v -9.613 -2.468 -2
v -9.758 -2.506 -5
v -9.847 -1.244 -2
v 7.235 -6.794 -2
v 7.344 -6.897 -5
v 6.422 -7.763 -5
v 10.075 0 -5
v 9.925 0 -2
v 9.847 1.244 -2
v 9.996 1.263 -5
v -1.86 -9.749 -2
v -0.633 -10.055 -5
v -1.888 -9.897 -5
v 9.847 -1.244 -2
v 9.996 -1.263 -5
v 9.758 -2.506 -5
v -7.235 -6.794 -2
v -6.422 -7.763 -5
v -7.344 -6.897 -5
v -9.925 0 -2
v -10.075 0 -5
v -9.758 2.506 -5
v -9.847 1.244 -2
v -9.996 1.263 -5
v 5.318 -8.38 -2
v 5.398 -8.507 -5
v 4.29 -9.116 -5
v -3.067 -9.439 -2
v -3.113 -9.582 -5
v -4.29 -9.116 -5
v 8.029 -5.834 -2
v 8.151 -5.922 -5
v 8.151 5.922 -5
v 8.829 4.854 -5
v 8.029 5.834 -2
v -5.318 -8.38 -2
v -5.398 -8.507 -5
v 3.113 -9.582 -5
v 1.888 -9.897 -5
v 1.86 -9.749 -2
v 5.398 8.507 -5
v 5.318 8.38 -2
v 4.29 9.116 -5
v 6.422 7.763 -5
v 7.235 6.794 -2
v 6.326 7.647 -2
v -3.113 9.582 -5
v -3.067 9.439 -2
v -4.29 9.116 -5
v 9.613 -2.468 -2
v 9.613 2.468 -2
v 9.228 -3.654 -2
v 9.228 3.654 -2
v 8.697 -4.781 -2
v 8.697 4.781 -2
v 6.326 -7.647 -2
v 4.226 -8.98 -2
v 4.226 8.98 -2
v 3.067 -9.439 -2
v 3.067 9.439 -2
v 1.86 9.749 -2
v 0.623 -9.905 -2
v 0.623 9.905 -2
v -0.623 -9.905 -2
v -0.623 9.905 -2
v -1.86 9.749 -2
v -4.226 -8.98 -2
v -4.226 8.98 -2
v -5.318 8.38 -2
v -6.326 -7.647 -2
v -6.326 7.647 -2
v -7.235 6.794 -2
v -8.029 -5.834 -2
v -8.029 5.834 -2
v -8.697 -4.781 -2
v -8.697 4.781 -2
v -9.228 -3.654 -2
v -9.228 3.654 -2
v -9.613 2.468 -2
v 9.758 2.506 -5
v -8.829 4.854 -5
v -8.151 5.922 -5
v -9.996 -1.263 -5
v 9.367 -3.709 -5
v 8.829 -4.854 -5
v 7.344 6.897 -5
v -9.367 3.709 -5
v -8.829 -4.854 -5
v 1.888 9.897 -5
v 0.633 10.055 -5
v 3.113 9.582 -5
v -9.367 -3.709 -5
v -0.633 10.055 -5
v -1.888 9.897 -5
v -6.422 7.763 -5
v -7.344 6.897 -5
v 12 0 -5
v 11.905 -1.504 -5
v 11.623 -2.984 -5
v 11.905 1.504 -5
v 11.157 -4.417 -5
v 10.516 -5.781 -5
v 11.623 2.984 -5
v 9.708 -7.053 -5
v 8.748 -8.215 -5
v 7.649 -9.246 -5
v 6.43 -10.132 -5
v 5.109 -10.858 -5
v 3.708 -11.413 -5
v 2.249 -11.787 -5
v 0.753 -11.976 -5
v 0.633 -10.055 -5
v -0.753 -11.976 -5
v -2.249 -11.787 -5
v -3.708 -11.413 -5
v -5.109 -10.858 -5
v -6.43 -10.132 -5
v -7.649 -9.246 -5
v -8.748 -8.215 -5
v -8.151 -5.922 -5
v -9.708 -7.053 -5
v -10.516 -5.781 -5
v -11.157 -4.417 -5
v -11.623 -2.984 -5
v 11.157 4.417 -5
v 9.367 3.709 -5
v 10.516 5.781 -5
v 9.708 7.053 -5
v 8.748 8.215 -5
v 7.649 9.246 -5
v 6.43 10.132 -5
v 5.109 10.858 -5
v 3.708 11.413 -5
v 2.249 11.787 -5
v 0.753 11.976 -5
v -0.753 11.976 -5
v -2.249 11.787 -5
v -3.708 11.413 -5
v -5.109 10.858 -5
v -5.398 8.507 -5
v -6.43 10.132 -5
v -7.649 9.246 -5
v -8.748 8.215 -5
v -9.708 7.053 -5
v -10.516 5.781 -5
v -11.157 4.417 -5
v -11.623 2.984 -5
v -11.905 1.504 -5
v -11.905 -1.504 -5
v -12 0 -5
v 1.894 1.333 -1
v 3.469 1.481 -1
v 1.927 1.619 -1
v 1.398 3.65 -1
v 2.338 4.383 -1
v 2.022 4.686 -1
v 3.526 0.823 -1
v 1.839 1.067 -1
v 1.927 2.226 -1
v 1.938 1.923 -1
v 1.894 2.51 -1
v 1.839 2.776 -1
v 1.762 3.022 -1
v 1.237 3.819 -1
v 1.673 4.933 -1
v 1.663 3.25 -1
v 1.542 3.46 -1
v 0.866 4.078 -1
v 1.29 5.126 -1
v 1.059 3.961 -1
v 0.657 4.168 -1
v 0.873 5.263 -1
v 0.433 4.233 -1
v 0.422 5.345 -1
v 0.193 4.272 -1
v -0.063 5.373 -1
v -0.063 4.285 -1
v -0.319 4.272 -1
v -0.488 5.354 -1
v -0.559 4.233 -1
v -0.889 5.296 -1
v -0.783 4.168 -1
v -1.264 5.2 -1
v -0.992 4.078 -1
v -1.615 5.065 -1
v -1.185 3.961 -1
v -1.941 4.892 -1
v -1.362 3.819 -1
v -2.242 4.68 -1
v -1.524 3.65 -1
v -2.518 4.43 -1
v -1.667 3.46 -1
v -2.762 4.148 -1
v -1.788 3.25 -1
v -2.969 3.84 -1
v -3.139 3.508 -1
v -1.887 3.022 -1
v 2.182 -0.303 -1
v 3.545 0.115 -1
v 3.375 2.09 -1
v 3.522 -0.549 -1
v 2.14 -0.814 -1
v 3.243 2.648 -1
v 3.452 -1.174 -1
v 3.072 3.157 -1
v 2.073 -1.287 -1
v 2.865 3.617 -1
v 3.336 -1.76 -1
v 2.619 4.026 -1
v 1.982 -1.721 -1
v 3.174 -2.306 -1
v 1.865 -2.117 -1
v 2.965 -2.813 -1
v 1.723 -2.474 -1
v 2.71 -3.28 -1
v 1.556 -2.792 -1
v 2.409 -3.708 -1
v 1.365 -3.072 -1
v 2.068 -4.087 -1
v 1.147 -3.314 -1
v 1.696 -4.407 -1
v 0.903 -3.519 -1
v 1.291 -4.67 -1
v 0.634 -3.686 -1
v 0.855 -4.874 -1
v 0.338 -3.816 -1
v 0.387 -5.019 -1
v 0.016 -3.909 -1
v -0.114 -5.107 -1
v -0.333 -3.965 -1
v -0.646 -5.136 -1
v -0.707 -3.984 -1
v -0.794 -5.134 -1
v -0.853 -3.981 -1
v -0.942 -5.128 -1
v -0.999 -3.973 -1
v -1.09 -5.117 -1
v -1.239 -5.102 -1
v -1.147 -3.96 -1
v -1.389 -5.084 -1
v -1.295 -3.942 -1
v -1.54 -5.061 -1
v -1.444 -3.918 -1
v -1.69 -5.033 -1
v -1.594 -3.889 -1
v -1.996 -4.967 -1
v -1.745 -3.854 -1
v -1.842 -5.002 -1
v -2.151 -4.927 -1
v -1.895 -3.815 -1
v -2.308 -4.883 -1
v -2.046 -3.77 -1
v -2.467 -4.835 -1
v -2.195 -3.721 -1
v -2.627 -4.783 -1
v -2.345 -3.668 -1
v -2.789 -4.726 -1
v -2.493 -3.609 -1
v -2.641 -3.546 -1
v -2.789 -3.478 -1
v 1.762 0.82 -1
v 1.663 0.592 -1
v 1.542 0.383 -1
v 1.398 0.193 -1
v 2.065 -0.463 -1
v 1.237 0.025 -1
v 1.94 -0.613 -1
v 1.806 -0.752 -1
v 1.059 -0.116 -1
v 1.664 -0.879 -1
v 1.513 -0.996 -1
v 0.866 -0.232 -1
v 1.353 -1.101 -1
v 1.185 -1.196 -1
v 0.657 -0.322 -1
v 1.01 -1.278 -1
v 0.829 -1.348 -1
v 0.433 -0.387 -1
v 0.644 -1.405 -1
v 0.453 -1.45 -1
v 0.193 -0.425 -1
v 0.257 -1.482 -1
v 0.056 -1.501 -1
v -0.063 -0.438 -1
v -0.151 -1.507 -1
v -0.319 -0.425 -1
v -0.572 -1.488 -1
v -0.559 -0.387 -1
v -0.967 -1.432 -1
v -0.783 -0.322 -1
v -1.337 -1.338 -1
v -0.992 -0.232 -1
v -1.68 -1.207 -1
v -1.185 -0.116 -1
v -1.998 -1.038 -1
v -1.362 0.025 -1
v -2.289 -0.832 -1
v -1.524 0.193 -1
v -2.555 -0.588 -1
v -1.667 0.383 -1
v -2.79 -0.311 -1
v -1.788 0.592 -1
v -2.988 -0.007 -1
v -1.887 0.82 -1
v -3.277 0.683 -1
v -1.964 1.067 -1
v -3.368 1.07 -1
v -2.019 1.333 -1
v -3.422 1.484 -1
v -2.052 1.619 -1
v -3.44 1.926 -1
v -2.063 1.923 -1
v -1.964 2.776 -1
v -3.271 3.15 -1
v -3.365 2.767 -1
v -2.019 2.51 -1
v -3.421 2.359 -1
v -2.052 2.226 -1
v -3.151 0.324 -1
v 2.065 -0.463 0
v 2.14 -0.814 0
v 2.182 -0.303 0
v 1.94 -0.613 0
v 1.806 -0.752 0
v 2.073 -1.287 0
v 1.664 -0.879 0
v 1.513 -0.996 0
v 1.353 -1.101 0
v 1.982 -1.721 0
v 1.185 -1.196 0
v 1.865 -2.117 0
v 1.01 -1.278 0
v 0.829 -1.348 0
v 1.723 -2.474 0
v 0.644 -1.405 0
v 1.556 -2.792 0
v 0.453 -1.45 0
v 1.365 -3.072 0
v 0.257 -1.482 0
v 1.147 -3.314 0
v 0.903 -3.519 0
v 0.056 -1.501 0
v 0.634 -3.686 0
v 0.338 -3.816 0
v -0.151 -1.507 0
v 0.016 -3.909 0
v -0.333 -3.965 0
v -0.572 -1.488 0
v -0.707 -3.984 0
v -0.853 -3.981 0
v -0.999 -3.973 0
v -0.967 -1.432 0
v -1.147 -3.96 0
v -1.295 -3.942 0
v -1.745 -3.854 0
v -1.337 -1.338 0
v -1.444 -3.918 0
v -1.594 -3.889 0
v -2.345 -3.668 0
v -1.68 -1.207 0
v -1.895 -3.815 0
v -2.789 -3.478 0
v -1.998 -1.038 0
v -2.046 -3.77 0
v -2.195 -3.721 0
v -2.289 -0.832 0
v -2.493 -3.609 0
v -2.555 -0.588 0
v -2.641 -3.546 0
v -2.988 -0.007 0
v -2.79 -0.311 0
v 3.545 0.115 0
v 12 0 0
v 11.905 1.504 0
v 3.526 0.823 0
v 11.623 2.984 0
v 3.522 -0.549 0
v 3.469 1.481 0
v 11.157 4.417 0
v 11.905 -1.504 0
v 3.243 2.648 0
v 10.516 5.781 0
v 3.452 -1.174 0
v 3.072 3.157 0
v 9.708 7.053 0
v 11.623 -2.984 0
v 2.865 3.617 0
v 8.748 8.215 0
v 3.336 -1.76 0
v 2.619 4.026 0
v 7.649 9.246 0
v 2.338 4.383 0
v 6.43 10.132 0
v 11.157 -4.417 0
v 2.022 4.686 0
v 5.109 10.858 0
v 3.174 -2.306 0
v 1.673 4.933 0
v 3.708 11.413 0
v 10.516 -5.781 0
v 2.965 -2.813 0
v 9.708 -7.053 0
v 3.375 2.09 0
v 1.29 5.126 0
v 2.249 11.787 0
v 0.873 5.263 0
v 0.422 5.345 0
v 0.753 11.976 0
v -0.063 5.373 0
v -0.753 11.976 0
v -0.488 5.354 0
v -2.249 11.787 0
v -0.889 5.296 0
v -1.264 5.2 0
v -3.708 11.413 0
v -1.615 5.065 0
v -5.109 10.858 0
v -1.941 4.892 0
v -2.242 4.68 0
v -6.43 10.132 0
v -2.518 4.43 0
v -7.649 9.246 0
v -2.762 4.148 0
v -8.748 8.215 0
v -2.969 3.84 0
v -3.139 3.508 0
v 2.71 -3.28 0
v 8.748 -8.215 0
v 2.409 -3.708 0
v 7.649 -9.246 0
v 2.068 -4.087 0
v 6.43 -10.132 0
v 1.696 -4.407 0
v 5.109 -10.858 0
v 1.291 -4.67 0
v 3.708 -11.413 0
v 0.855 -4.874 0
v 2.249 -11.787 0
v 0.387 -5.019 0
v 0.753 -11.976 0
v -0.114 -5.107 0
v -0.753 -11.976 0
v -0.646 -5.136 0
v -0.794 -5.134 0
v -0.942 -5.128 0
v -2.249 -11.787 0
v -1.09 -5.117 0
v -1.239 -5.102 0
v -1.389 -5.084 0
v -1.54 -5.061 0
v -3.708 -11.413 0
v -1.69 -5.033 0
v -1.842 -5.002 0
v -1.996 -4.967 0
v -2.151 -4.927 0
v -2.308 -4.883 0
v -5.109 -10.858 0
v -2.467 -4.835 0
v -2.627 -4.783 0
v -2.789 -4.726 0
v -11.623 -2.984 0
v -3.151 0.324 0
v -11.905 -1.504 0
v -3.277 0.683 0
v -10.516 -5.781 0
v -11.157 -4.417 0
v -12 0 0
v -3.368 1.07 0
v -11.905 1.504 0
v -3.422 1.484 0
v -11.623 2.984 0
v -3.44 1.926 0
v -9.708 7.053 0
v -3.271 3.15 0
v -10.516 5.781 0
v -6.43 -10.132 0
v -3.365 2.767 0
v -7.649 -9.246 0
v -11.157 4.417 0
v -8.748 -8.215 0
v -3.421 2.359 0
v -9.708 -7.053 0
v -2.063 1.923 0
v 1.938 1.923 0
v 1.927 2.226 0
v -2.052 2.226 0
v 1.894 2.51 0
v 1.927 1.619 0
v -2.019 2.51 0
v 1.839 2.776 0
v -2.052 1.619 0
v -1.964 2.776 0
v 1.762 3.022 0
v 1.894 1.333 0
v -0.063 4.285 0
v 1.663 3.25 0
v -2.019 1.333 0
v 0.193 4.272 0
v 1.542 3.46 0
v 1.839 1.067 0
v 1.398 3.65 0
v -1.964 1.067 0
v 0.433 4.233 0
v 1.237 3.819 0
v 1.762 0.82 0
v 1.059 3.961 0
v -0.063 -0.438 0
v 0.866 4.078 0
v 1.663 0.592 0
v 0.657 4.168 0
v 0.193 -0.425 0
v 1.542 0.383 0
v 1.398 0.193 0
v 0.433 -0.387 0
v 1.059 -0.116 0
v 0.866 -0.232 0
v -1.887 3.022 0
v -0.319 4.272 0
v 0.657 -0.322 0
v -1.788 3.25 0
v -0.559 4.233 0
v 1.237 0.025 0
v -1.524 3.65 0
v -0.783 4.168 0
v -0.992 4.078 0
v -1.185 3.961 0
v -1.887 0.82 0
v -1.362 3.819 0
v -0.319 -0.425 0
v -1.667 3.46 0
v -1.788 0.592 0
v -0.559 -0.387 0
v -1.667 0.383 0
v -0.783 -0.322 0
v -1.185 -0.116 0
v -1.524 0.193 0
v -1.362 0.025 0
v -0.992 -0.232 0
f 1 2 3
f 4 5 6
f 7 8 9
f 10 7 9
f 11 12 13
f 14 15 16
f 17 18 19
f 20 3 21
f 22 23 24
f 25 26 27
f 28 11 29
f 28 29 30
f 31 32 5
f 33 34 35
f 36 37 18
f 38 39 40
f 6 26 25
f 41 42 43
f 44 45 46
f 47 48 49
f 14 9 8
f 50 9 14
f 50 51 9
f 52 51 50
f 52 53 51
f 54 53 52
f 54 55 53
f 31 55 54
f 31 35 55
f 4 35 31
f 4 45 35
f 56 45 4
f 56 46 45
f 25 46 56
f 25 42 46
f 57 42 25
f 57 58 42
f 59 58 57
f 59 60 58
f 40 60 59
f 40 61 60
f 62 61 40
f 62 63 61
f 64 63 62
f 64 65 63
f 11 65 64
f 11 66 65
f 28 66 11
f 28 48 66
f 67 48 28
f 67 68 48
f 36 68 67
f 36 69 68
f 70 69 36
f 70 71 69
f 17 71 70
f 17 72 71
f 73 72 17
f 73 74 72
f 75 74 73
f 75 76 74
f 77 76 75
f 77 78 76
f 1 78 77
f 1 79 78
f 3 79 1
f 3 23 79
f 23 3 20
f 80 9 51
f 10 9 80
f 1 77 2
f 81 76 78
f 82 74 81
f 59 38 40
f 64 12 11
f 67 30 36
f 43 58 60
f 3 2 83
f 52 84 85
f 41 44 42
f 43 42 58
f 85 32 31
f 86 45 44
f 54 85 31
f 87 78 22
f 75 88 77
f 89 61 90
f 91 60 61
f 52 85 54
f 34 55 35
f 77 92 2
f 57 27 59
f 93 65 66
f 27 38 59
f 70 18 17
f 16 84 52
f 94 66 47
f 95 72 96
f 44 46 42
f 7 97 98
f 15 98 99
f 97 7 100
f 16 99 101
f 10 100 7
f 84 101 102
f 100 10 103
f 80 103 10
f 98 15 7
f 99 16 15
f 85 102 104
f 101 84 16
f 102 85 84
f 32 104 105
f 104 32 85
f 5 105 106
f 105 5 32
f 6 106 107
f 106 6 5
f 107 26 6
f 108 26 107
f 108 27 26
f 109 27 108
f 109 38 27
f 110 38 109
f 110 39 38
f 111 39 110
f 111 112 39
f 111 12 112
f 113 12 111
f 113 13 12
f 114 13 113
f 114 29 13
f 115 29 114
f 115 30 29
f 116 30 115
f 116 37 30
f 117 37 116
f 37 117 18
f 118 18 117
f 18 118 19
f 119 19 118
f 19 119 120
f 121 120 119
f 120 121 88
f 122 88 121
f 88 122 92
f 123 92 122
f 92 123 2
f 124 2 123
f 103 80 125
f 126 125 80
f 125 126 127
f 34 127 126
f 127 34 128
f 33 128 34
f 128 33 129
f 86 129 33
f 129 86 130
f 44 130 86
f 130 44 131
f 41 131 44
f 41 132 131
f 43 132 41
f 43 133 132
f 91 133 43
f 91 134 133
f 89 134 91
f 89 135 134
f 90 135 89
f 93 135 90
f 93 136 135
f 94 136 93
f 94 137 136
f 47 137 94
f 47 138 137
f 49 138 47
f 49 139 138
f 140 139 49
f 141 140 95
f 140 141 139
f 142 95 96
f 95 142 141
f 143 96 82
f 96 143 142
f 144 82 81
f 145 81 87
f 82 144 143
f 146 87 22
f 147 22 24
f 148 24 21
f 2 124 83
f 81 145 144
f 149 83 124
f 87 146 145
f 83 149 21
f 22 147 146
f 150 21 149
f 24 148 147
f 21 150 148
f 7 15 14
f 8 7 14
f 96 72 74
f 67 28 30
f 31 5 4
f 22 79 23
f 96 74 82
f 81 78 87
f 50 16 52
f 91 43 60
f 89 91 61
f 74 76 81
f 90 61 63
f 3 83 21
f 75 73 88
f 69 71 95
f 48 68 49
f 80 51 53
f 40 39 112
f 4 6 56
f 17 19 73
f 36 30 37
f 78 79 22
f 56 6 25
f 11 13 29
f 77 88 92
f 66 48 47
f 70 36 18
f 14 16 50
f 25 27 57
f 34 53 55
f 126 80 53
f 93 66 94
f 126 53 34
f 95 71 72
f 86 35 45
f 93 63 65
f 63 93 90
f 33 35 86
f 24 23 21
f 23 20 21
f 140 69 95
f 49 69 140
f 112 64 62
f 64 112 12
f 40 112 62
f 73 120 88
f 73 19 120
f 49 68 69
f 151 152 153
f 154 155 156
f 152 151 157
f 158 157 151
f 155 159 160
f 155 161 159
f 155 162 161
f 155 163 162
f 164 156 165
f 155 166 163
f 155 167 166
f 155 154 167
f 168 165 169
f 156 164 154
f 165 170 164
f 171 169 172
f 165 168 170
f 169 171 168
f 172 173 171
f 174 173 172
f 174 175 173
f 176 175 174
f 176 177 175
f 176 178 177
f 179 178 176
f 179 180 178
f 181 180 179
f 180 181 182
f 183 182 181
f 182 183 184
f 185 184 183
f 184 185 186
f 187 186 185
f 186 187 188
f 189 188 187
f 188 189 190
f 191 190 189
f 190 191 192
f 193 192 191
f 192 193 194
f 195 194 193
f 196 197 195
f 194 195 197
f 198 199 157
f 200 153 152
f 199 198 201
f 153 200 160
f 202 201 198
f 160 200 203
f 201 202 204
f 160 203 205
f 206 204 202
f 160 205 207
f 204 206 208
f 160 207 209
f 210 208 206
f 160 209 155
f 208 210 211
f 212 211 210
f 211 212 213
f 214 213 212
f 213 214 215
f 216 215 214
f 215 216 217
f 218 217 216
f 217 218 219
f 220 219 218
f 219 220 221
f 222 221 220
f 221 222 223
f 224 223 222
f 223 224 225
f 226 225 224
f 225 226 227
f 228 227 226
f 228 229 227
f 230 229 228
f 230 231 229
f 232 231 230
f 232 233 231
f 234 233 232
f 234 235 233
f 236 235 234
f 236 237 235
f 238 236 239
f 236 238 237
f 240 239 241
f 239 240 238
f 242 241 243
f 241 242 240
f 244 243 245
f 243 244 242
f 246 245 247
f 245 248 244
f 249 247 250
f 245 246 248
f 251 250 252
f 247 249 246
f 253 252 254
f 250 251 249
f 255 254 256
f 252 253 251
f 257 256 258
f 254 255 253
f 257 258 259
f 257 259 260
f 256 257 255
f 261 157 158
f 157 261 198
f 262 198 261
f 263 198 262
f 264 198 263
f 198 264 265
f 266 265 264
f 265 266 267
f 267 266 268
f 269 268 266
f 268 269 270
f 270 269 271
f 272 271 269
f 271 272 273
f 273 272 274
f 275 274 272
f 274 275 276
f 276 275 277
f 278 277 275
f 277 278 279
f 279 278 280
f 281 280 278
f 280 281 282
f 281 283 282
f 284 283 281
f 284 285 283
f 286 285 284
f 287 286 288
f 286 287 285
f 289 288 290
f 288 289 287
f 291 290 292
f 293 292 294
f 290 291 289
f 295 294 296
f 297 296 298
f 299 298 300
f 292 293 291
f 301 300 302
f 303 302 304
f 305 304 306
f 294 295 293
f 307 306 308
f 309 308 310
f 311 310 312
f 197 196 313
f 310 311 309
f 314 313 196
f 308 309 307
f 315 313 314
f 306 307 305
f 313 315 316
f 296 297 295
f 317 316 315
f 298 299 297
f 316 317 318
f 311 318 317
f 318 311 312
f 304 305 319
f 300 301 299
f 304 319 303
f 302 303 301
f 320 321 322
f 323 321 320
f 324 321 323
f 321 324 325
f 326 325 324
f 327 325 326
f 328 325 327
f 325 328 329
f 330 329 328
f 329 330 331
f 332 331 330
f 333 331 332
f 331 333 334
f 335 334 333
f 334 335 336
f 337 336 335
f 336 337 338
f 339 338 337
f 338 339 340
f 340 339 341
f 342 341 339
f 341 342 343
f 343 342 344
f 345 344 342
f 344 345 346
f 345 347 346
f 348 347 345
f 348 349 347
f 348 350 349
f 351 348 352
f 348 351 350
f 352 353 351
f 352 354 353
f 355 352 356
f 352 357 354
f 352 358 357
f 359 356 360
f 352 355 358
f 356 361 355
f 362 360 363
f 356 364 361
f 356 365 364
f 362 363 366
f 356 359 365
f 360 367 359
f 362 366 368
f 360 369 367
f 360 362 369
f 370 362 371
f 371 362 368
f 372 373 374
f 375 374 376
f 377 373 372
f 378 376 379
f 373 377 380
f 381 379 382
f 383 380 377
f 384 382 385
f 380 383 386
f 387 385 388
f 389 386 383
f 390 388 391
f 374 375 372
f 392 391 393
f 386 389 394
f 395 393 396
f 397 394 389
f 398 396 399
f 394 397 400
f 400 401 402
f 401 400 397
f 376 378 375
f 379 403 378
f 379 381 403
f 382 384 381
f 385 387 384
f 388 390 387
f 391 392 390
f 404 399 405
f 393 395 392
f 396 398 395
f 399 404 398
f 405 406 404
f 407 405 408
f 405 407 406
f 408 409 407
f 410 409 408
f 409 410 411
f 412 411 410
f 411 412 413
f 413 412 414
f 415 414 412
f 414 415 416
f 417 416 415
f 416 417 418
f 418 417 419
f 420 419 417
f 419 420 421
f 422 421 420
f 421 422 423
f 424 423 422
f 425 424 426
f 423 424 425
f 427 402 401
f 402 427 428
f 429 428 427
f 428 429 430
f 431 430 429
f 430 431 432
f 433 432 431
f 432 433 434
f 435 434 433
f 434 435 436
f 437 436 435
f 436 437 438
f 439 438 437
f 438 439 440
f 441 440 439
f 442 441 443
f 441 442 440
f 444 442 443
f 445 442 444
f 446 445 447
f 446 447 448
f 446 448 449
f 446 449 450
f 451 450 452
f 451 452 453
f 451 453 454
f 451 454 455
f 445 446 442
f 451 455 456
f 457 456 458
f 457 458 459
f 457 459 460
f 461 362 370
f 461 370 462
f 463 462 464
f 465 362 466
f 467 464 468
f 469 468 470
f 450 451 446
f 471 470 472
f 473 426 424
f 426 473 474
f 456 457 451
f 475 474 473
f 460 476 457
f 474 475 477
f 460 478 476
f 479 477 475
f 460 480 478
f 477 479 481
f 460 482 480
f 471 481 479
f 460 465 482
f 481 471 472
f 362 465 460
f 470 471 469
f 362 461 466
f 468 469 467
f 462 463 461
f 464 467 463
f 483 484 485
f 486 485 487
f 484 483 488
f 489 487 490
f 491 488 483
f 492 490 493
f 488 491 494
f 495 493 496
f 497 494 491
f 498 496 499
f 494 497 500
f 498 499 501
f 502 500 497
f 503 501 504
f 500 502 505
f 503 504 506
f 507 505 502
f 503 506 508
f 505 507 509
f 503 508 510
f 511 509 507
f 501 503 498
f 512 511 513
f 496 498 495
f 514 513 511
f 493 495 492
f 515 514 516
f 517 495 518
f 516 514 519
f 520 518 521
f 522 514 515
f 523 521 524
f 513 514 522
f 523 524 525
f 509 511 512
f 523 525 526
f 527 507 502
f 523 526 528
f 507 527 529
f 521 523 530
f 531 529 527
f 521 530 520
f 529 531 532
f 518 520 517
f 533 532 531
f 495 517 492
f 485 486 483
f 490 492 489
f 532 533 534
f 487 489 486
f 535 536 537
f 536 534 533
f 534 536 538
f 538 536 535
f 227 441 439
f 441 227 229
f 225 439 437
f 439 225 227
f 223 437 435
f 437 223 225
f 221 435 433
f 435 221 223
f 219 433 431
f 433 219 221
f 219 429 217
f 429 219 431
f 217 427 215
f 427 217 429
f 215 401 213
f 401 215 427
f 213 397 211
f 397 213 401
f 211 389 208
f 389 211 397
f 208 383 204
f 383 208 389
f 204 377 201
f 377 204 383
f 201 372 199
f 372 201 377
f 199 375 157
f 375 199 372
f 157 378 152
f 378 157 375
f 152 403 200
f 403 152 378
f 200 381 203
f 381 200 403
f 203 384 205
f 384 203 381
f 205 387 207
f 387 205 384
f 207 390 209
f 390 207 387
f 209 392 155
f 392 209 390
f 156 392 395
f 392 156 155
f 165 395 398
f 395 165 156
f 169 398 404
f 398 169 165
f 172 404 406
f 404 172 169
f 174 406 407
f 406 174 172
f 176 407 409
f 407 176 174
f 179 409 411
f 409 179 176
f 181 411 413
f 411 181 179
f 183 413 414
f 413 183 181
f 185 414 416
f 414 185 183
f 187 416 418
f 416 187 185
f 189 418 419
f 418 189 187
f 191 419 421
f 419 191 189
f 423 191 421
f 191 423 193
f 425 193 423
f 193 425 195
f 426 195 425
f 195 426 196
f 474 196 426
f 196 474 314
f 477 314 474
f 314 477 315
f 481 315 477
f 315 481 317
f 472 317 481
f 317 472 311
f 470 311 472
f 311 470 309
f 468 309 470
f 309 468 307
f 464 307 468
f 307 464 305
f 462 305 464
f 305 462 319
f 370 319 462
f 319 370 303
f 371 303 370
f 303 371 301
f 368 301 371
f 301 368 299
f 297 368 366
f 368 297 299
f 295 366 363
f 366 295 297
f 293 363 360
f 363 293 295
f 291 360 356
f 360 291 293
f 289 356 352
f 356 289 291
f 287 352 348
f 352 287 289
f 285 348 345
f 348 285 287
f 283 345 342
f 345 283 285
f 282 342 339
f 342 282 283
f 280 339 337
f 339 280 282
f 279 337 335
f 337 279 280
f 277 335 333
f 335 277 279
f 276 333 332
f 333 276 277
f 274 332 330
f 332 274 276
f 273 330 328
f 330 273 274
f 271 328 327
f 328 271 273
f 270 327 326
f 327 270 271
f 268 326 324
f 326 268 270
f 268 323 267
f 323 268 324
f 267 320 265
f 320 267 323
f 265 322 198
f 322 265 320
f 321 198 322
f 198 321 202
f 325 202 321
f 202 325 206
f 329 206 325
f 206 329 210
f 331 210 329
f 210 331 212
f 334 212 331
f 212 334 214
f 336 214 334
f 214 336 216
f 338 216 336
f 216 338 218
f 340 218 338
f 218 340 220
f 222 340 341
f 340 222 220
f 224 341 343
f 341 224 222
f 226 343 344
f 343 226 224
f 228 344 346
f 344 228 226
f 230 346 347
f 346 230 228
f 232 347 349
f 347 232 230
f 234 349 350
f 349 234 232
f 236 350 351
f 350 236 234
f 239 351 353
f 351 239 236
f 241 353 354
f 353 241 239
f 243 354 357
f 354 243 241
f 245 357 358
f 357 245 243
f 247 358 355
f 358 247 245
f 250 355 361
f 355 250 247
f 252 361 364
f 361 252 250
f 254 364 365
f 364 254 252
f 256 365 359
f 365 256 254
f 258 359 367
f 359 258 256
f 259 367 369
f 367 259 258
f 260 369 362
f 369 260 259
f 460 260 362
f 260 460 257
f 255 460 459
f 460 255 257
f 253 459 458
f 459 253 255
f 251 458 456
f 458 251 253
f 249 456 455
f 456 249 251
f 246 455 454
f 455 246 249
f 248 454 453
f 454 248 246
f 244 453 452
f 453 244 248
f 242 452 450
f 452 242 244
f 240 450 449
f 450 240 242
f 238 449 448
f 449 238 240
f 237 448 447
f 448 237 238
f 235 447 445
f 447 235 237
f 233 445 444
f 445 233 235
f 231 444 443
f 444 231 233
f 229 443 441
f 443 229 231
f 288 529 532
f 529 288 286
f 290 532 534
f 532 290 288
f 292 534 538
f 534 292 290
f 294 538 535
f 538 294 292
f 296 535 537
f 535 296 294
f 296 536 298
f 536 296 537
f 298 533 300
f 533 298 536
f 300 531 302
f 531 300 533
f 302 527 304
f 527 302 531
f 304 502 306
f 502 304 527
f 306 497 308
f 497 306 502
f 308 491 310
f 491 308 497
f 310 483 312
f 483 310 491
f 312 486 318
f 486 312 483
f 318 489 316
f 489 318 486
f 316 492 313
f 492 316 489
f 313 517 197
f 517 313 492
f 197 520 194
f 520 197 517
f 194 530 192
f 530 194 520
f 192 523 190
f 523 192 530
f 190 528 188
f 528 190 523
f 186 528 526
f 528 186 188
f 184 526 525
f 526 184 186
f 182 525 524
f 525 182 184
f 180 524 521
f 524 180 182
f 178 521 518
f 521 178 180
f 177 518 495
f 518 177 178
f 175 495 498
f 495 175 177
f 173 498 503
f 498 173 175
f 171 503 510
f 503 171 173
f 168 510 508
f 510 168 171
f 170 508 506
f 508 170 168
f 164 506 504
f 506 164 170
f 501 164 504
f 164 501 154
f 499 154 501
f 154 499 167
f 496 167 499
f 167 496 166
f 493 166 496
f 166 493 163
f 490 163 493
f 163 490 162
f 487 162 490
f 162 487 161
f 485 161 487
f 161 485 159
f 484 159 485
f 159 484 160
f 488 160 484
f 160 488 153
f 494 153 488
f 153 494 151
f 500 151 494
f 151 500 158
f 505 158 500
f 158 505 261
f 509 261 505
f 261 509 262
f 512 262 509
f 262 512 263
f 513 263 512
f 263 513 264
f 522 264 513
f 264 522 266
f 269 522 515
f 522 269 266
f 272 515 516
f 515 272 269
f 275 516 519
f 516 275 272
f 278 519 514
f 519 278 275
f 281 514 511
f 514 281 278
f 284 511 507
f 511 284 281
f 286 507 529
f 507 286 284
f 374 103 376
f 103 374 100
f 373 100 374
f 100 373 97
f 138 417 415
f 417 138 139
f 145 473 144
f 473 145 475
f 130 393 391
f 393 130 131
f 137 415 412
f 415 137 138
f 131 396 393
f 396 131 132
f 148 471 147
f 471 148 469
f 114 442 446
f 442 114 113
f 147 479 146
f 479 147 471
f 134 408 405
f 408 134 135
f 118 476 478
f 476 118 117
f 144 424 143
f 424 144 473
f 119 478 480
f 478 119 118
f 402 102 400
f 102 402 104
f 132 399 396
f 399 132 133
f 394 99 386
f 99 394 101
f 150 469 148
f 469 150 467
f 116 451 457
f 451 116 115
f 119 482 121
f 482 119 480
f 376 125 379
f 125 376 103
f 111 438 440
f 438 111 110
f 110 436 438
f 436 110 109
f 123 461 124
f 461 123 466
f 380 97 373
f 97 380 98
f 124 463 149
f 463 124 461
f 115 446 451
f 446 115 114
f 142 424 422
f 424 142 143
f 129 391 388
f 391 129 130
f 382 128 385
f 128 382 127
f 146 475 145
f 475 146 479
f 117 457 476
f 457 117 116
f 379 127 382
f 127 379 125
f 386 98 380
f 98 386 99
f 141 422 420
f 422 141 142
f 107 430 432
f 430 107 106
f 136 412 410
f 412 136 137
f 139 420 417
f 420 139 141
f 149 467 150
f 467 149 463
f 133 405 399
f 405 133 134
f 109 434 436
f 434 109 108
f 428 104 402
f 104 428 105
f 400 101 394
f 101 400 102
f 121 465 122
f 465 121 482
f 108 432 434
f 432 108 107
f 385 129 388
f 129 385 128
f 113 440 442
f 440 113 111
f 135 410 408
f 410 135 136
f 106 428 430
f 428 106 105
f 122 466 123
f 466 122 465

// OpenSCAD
$fn = 50;


difference() {
	union() {
		translate(v = [0, 0, -5.0000000000]) {
			cylinder(h = 5, r = 12.0000000000);
		}
	}
	union() {
		#translate(v = [0, 0, -5.0000000000]) {
			cylinder(h = 3, r1 = 10.0750000000, r2 = 9.9250000000);
		}
		translate(v = [0, 0, -1]) {
			linear_extrude(height = 1) {
				text(font = "Impact", halign = "center", size = 10, text = "9", valign = "center");
			}
		}
	}
}
